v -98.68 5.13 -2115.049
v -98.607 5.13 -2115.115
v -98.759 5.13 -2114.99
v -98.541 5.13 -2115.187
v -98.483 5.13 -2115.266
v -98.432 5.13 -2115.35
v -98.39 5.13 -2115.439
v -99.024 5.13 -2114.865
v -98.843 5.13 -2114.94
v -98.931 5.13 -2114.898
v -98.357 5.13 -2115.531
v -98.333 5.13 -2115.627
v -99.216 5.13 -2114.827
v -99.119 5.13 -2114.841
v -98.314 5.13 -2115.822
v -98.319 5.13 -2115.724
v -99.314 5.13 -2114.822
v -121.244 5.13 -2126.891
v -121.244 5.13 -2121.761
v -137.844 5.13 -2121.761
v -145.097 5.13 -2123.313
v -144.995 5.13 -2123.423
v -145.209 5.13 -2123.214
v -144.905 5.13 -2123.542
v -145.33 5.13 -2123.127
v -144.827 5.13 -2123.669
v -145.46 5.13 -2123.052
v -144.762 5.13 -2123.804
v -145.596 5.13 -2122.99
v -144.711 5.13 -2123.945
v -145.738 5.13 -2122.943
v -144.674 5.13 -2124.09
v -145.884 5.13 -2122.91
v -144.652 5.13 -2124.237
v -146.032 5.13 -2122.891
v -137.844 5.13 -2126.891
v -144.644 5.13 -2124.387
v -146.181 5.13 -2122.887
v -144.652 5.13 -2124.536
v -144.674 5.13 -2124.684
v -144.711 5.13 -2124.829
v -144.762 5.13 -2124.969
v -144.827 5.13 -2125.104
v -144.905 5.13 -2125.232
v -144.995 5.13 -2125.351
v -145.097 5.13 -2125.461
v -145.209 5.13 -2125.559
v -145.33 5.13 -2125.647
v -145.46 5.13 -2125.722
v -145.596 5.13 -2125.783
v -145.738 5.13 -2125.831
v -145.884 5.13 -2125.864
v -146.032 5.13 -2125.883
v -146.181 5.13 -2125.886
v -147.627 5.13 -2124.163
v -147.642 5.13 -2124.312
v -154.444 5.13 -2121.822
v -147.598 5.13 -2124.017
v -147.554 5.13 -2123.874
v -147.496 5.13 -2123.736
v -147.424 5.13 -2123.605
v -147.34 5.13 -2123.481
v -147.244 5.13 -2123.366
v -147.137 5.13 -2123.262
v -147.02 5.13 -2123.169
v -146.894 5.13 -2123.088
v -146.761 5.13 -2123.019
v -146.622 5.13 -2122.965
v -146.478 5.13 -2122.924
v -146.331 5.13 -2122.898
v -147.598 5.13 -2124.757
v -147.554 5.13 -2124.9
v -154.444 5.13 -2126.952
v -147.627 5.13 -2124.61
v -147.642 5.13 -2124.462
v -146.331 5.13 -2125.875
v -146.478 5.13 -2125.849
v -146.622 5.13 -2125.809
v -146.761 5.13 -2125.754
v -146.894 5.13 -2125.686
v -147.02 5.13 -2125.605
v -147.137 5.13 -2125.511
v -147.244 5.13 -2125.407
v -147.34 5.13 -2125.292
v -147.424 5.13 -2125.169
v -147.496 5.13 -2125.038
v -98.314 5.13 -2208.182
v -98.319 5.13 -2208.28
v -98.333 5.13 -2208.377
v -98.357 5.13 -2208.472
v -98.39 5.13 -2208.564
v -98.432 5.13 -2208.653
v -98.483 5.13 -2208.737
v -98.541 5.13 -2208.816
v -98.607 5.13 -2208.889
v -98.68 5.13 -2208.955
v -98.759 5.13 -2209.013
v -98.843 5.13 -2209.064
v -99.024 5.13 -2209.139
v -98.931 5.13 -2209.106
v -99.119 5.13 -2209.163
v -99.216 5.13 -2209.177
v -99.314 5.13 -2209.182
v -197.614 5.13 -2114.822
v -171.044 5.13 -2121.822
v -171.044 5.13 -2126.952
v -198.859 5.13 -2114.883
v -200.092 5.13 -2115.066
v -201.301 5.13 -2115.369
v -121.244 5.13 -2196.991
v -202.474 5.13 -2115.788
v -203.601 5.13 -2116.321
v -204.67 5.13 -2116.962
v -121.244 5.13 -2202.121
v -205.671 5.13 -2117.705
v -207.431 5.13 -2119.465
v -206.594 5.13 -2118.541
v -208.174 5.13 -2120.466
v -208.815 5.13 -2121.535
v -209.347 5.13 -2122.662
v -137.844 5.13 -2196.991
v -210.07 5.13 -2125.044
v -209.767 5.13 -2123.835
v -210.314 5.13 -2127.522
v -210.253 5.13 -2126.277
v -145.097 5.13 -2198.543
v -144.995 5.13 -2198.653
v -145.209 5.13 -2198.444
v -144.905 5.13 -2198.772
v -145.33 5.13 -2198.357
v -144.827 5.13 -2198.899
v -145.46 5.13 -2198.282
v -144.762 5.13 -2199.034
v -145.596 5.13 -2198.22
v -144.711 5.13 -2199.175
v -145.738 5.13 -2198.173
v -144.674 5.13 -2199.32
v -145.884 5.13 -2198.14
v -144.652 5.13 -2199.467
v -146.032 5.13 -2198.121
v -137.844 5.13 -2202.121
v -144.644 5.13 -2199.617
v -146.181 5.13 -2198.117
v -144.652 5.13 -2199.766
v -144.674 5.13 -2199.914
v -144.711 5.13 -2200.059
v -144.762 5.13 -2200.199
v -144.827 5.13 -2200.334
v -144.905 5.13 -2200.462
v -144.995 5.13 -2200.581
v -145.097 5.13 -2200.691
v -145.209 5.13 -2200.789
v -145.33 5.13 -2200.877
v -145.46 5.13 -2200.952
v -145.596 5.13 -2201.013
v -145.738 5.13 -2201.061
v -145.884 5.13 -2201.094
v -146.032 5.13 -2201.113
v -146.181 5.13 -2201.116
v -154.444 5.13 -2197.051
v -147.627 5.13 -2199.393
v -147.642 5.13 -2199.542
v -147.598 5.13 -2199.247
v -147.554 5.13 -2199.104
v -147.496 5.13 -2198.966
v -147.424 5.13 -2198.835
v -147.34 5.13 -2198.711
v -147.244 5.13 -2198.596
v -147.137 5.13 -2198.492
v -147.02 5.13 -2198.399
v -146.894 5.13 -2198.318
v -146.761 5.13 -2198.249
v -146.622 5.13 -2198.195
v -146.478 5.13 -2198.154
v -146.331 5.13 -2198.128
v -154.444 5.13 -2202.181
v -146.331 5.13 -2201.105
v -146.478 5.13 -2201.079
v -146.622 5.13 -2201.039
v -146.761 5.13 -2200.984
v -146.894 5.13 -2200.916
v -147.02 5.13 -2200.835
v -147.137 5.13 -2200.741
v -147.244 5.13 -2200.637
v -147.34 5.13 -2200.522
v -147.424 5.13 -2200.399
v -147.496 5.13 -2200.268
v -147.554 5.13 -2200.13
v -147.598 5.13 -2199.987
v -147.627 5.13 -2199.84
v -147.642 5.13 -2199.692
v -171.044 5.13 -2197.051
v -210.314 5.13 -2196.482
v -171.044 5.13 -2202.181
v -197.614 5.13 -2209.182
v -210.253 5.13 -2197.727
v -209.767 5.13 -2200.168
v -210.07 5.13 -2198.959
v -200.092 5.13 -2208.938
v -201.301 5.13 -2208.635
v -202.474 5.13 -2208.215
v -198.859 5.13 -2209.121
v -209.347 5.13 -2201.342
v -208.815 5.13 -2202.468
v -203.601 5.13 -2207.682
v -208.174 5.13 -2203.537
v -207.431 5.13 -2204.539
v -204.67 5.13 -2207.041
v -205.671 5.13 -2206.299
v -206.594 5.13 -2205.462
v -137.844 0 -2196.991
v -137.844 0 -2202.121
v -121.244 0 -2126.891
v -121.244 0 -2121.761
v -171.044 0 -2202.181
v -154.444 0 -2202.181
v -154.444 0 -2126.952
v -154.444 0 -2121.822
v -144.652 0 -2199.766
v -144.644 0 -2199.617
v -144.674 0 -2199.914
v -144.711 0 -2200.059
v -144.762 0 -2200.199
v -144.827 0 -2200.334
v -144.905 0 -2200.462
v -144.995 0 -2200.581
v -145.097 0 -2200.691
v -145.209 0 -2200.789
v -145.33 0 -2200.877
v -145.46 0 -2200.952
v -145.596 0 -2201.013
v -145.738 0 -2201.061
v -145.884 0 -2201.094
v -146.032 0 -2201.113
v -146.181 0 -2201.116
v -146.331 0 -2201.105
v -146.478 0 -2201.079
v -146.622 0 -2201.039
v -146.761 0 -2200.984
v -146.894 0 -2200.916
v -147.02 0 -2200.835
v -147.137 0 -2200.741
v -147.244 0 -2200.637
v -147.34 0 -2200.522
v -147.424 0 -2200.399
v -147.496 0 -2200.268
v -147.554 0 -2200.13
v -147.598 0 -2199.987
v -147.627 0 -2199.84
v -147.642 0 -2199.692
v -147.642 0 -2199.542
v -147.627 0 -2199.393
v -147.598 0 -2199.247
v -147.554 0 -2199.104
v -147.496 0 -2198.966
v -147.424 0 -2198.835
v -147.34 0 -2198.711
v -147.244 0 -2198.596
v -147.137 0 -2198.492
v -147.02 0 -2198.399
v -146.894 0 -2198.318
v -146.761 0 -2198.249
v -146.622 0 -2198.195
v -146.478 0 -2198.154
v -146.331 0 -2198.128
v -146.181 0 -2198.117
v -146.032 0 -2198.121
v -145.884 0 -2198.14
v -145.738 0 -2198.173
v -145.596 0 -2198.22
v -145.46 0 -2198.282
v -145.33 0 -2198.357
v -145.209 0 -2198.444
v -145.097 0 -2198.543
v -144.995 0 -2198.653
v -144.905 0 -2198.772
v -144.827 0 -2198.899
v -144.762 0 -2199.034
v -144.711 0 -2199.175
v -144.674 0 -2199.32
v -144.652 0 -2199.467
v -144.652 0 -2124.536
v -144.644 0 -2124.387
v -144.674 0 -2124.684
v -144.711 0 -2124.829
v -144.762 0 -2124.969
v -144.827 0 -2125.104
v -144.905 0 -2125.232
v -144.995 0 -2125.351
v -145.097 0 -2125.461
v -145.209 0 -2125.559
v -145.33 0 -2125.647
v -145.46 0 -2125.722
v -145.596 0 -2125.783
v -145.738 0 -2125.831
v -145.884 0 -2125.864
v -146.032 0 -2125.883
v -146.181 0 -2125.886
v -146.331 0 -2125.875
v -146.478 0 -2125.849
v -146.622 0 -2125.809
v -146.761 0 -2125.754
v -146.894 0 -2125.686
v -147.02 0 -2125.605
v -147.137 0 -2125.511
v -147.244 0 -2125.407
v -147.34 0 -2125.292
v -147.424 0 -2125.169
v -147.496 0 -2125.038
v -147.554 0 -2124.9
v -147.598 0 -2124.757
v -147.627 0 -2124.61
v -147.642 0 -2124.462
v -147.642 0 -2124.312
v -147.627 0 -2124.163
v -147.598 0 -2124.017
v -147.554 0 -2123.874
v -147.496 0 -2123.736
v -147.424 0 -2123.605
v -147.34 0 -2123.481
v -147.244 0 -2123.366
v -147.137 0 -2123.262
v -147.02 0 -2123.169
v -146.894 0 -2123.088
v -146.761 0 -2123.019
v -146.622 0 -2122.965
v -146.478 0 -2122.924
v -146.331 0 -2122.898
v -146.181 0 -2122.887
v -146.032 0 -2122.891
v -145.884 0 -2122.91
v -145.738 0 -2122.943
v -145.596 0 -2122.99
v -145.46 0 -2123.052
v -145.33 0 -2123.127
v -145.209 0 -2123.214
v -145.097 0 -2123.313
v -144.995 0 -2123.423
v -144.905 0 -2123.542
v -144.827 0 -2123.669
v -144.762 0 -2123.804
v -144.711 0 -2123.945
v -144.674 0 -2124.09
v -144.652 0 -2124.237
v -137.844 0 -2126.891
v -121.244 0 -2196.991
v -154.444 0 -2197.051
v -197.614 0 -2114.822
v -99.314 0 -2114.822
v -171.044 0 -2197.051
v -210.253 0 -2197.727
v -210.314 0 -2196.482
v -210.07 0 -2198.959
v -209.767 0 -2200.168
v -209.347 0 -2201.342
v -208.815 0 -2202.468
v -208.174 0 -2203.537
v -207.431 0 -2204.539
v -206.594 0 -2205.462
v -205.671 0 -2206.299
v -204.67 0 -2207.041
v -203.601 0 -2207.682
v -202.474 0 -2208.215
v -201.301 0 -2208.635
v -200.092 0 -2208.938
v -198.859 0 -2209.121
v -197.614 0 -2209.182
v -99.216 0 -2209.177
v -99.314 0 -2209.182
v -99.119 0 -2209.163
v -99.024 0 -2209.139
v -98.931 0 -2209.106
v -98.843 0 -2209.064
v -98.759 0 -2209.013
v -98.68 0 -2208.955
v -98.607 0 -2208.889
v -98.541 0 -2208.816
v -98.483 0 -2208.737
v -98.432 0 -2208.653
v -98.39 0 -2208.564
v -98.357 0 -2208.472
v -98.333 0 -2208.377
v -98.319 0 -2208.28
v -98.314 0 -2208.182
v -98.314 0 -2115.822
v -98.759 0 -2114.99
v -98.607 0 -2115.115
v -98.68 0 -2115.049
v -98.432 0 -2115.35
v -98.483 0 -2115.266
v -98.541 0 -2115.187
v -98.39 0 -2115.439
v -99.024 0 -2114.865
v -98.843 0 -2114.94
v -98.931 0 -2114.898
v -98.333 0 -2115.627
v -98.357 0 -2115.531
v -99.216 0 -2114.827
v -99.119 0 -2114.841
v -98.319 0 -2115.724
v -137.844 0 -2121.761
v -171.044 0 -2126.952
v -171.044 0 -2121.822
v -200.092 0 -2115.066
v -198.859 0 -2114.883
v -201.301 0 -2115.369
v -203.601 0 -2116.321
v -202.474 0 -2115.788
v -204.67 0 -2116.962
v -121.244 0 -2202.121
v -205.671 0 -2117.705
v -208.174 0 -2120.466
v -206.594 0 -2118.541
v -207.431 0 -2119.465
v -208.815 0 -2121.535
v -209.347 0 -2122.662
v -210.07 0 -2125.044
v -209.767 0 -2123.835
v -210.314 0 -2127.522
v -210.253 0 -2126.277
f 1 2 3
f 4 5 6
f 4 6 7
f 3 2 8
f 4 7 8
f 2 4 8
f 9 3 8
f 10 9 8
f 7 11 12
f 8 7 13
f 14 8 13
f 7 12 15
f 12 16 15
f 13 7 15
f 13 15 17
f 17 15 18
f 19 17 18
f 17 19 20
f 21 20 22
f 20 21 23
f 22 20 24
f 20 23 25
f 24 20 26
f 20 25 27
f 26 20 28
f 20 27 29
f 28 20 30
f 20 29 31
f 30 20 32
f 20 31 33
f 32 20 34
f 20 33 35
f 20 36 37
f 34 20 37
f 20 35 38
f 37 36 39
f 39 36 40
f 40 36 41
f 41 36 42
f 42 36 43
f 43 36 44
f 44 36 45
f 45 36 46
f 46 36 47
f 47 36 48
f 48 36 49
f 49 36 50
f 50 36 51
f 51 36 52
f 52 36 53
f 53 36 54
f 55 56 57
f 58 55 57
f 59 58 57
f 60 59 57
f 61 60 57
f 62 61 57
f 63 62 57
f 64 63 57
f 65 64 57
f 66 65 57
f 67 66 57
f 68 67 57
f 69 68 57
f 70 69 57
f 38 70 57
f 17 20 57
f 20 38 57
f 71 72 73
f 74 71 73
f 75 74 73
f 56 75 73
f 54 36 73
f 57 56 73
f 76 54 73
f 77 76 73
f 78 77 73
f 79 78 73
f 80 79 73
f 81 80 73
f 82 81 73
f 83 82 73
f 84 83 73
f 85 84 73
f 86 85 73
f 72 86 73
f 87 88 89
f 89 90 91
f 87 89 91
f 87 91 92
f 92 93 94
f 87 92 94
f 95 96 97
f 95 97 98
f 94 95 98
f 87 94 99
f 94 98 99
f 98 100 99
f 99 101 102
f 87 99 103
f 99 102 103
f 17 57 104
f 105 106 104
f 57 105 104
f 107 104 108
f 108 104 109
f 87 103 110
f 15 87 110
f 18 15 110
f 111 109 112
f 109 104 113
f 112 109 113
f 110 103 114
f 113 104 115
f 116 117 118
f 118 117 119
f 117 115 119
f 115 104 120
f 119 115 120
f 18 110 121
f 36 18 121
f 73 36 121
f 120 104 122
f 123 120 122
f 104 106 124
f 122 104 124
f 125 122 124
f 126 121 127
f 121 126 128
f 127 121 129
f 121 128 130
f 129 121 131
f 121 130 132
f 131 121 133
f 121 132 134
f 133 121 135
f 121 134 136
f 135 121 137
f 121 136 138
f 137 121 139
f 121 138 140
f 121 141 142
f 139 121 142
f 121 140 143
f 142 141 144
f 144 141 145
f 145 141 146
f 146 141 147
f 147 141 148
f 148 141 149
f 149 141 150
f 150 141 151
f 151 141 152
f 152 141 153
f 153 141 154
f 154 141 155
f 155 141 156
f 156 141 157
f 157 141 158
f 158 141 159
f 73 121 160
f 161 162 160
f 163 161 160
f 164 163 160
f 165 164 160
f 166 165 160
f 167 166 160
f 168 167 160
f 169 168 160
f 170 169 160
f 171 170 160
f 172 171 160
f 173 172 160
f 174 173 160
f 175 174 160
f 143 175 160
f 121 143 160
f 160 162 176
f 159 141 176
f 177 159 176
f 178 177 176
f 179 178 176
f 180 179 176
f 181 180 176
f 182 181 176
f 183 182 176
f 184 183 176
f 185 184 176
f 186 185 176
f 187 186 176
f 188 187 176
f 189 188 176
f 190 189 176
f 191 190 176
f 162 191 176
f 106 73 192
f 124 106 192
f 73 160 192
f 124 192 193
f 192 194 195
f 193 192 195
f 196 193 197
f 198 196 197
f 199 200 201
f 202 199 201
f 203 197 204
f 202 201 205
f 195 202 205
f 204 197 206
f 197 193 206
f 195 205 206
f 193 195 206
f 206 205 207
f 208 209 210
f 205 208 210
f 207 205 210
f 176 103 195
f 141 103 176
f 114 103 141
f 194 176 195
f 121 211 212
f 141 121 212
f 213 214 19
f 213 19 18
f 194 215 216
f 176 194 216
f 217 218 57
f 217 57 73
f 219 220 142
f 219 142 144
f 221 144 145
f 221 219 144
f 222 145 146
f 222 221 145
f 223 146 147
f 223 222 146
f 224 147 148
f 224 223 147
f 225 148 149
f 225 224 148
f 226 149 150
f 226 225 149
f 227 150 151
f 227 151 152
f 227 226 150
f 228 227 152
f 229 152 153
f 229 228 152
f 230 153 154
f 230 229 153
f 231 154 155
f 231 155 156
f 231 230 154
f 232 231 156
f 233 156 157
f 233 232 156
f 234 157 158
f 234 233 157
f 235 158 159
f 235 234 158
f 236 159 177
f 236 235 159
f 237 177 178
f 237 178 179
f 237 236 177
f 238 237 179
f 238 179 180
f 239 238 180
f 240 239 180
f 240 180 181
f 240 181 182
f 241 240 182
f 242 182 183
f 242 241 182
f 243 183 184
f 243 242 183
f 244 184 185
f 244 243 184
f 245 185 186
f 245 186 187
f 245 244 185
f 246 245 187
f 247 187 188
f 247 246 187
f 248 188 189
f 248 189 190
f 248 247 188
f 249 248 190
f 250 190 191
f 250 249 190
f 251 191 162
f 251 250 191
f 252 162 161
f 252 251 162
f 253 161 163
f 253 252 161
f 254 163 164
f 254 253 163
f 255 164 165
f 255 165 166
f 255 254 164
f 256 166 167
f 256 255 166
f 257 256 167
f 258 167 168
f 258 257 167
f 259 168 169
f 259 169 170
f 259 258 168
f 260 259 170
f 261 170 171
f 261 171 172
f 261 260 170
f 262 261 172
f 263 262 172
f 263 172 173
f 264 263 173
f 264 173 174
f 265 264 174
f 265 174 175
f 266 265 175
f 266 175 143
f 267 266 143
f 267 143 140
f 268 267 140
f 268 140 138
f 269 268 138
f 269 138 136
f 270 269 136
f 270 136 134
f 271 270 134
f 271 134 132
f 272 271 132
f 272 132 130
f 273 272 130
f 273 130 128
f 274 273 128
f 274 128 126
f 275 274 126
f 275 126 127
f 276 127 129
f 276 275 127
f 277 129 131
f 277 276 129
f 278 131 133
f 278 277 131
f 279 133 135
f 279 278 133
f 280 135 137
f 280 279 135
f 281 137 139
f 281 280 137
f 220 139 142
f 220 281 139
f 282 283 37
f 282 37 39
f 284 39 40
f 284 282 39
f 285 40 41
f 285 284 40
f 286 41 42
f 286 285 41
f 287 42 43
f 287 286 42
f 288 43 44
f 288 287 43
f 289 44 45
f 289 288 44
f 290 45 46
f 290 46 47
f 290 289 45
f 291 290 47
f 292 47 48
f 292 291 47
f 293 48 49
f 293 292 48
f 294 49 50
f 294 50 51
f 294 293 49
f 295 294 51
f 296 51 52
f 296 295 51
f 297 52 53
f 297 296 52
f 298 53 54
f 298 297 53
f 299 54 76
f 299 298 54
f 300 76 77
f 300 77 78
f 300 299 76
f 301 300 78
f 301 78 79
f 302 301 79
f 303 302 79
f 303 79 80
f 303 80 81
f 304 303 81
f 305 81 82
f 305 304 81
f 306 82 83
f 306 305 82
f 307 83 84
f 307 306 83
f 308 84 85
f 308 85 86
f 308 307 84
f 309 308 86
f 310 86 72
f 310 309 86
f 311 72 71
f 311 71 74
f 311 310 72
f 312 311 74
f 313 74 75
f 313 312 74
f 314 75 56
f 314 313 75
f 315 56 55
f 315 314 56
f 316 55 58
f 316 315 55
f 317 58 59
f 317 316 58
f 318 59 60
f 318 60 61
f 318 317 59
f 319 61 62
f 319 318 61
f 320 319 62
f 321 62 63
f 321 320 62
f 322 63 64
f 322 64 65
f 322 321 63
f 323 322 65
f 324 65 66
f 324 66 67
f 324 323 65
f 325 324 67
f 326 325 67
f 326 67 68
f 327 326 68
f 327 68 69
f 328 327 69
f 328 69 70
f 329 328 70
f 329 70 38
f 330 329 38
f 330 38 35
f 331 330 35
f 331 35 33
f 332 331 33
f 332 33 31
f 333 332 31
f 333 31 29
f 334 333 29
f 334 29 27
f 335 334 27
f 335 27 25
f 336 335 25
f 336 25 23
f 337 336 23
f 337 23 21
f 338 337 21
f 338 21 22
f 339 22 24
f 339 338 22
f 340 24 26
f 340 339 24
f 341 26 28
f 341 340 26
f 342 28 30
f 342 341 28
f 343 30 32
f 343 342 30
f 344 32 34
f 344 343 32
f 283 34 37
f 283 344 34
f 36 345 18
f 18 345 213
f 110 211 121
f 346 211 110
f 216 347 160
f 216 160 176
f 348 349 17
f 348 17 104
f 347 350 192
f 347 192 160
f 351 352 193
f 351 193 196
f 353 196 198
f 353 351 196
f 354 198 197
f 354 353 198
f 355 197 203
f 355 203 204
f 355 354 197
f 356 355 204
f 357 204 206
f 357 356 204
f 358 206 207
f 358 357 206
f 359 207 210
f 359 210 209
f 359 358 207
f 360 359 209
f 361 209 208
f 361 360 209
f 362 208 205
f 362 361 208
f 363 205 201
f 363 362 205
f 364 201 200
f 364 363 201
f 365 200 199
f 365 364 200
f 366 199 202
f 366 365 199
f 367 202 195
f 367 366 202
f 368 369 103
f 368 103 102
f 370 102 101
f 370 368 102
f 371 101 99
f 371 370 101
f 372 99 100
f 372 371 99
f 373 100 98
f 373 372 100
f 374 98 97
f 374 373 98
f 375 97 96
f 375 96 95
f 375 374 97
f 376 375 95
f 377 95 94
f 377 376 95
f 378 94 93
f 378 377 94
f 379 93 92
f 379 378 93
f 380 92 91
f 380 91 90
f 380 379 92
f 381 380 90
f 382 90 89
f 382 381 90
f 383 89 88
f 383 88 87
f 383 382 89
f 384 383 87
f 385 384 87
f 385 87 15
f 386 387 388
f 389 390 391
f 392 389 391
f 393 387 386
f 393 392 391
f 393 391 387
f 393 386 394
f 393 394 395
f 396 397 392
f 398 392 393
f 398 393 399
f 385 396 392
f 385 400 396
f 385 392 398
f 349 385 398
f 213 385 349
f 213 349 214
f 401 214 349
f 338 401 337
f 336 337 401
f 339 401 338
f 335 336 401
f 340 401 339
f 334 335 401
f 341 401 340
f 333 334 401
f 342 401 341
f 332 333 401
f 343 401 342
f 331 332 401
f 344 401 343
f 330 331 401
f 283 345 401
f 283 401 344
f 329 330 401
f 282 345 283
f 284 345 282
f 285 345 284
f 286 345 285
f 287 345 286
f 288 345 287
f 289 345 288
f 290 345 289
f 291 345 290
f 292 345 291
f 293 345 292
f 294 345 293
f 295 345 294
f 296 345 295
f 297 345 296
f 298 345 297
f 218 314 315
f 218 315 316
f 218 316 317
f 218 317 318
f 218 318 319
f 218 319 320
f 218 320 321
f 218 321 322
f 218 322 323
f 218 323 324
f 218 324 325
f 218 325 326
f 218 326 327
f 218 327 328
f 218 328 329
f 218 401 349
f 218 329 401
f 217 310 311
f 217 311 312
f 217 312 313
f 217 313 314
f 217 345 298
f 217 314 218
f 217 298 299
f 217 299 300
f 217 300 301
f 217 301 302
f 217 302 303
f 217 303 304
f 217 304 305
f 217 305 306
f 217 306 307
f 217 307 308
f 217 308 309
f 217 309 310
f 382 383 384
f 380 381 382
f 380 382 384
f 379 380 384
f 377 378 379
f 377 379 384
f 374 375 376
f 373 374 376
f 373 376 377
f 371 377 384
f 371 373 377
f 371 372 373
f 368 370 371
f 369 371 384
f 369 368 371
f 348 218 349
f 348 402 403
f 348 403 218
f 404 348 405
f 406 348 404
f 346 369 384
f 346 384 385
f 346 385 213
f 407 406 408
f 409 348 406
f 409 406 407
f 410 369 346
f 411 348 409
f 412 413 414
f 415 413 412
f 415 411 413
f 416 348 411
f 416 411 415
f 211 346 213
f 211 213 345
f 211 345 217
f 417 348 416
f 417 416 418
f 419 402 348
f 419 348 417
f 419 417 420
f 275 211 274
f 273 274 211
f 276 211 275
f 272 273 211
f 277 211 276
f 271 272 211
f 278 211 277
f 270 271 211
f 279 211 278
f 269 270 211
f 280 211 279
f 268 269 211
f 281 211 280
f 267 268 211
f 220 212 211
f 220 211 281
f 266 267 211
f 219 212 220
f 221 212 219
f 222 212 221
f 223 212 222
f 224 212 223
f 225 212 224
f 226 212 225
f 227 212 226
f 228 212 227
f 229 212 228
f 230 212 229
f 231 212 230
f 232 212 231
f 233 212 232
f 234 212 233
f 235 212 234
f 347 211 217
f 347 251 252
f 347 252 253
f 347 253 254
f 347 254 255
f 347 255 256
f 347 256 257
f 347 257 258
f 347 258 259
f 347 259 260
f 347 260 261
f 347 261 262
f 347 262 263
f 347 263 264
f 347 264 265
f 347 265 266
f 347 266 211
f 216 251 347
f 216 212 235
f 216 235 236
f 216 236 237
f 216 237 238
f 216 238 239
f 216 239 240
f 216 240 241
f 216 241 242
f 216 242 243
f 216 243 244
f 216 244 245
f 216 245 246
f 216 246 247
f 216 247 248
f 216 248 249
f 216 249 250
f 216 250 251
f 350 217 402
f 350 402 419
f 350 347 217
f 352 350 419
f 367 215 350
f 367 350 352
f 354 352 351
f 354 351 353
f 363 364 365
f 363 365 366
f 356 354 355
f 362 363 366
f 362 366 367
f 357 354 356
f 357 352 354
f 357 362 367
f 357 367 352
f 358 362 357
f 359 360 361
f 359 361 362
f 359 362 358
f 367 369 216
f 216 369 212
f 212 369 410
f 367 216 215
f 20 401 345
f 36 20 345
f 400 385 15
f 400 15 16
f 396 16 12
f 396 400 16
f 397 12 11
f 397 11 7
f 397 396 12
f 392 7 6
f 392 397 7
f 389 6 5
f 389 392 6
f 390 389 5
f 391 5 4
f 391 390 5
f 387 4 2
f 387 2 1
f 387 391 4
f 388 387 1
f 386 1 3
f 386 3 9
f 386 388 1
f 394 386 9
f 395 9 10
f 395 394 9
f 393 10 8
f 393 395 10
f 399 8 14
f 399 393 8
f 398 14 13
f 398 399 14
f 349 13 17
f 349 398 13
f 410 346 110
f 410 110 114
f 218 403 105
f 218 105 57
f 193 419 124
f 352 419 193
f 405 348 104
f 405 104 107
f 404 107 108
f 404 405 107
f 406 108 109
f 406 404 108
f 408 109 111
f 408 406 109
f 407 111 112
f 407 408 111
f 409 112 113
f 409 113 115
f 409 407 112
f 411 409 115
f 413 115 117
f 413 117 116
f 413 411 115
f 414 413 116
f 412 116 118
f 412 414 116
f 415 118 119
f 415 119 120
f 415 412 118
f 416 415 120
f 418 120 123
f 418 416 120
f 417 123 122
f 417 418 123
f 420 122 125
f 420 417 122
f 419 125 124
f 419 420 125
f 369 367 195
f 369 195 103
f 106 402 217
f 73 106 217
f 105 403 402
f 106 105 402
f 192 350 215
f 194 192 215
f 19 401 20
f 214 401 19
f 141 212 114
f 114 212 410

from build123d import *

# Parameters (mm, degrees)
SKETCH2_R                   = 1.5
SKETCH2_W                   = 16.6
SKETCH2_H                   = 5.13
BOSS_EXTRUDE1_DEPTH         = 5.13
F_1_2_CLEARANCE_HOLE1_D     = 13.89126
F_1_2_CLEARANCE_HOLE1_DEPTH = 5.13


with BuildPart() as part:
    # Sketch2 → Boss-Extrude1 (new body)
    with BuildSketch(Plane(origin=(0, 0, 0), x_dir=(1, 0, 0), z_dir=(0, 1, 0))):
        with BuildLine():
            Line((-210.314103066, 2127.521742865), (-210.314103066, 2196.481742865))
            ThreePointArc((-210.314103066, 2196.481742865), (-206.594359187, 2205.461998986), (-197.614103066, 2209.181742865))
            Line((-197.614103066, 2209.181742865), (-99.314103066, 2209.181742865))
            ThreePointArc((-99.314103066, 2209.181742865), (-98.606996285, 2208.888849646), (-98.314103066, 2208.181742865))
            Line((-98.314103066, 2208.181742865), (-98.314103066, 2115.821742865))
            ThreePointArc((-98.314103066, 2115.821742865), (-98.606996285, 2115.114636084), (-99.314103066, 2114.821742865))
            Line((-99.314103066, 2114.821742865), (-197.614103066, 2114.821742865))
            ThreePointArc((-197.614103066, 2114.821742865), (-206.594359187, 2118.541486744), (-210.314103066, 2127.521742865))
        make_face()
        with Locations((-146.144103066, 2199.616742865)):
            Circle(SKETCH2_R, mode=Mode.SUBTRACT)
        with Locations((-146.144103066, 2124.386742865)):
            Circle(SKETCH2_R, mode=Mode.SUBTRACT)
        with Locations((-129.544103066, 2124.326494276)):
            Rectangle(SKETCH2_W, SKETCH2_H, mode=Mode.SUBTRACT)
        with Locations((-162.744103066, 2124.386742865)):
            Rectangle(SKETCH2_W, SKETCH2_H, mode=Mode.SUBTRACT)
        with Locations((-162.744103066, 2199.615933693)):
            Rectangle(SKETCH2_W, SKETCH2_H, mode=Mode.SUBTRACT)
        with Locations((-129.544103066, 2199.555685104)):
            Rectangle(SKETCH2_W, SKETCH2_H, mode=Mode.SUBTRACT)
    extrude(amount=BOSS_EXTRUDE1_DEPTH)

    # 1/2 Clearance Hole1
    with Locations(Plane(origin=(0, 5.13, 0), x_dir=(-1, 0, 0), z_dir=(0, 1, 0))):
        with Locations((-8.273522926, -2159.461742865)):
            Hole(F_1_2_CLEARANCE_HOLE1_D / 2, depth=F_1_2_CLEARANCE_HOLE1_DEPTH)


solid = part.part
